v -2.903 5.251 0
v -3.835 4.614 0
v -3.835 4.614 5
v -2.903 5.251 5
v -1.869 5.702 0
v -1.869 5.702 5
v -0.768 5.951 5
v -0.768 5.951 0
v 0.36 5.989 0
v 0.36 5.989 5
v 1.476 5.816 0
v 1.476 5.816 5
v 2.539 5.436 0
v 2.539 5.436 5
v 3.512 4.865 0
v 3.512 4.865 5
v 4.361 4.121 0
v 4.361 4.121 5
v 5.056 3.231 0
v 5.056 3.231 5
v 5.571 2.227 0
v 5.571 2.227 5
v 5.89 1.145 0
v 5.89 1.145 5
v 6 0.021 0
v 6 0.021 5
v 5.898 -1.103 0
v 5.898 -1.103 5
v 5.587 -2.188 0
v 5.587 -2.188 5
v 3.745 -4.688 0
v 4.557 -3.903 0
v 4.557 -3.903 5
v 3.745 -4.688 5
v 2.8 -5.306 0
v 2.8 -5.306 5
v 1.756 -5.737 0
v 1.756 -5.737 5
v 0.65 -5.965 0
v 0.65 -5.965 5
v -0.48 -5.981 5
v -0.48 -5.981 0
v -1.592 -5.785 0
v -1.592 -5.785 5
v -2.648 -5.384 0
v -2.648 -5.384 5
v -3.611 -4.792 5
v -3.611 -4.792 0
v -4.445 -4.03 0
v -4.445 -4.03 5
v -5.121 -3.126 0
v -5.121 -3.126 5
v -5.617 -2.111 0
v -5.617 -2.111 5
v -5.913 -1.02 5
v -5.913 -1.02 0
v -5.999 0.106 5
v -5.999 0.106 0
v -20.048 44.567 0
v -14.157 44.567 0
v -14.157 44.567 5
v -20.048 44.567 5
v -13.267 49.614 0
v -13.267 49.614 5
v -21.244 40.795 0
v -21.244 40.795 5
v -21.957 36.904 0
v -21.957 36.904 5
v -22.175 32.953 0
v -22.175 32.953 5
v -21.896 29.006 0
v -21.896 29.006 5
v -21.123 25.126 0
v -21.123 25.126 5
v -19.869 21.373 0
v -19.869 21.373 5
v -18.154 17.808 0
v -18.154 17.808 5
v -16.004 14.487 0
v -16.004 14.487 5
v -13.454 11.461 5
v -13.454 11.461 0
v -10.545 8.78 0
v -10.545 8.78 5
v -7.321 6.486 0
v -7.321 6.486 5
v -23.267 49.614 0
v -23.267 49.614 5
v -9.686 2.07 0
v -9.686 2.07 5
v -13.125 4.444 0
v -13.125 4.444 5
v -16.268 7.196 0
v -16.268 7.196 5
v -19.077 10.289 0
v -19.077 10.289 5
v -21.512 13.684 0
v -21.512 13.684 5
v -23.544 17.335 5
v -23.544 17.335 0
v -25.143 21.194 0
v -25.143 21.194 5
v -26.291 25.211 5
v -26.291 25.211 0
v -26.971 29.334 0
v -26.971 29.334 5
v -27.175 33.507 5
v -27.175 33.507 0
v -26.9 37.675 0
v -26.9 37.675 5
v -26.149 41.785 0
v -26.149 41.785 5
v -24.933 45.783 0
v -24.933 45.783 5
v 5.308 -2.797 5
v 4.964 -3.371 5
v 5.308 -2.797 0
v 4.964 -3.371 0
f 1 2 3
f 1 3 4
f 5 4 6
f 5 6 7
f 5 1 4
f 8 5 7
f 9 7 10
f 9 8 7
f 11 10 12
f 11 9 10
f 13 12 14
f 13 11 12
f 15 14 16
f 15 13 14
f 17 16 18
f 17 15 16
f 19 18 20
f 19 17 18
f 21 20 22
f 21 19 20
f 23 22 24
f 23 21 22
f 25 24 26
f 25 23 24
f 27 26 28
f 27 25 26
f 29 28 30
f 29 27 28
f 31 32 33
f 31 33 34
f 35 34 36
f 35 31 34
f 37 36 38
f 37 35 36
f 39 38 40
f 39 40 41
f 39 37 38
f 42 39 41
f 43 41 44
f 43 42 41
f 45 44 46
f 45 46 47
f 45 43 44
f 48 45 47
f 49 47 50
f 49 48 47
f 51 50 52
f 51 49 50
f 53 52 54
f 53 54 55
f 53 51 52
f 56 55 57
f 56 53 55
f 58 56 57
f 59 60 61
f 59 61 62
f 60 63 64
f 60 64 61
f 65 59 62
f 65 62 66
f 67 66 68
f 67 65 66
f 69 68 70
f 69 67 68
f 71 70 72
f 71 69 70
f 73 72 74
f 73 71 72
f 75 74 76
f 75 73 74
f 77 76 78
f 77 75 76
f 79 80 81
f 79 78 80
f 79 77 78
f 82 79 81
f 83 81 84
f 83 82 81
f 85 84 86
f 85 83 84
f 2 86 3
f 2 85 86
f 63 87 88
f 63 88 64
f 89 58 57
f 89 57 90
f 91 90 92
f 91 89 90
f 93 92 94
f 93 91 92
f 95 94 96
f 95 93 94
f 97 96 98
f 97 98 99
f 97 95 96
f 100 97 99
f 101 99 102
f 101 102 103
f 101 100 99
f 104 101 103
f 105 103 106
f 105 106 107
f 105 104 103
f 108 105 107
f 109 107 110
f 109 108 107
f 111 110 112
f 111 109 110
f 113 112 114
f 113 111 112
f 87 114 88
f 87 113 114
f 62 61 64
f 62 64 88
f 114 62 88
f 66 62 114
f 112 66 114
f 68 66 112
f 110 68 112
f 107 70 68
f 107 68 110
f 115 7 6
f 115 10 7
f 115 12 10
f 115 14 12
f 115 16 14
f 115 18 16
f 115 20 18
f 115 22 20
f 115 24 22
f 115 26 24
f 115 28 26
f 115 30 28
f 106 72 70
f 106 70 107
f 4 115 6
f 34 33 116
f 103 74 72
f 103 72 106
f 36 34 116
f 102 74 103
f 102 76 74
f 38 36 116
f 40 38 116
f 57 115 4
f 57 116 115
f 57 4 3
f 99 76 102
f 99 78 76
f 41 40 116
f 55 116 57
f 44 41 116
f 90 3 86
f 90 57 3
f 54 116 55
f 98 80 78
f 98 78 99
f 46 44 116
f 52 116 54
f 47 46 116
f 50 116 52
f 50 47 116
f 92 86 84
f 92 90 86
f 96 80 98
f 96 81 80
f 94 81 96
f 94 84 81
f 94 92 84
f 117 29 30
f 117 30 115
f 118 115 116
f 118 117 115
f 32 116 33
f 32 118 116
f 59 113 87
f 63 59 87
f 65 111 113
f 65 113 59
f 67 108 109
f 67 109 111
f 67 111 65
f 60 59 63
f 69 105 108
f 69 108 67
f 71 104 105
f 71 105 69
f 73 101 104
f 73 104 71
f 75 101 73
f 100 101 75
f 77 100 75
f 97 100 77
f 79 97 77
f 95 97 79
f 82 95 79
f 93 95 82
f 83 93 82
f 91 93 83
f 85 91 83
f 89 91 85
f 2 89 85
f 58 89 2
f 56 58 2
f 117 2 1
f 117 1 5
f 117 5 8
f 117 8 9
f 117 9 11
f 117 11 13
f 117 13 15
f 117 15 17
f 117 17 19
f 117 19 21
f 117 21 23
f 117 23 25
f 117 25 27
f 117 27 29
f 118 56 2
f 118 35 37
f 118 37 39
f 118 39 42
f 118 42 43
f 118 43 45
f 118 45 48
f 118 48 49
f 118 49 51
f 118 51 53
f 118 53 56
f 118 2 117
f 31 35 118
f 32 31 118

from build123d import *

# Parameters (mm, degrees)
BOSS_EXTRU_2_DEPTH           = 5
BOSS_EXTRU_8_START           = -1
BOSS_EXTRU_8_DEPTH           = 5
ENL_V_MAT_EXTRU_3_DEPTH      = 57.886804216
ENL_V_MAT_EXTRU_3_DEPTH_BACK = 57.886804216
ESQUISSE8_OUTSIDE_W          = 48.282
ESQUISSE8_OUTSIDE_H          = 25.106


with BuildPart() as part:
    # Esquisse1 → Boss.-Extru.2 (new body)
    with BuildSketch(Plane.XY):
        with BuildLine():
            ThreePointArc((5.586871342, -2.187891362), (5.144080872, -3.088435199), (4.557392942, -3.902584986))
            ThreePointArc((4.557392942, -3.902584986), (-5.144080872, 3.088435199), (5.586871342, -2.187891362))
        make_face()
    extrude(amount=BOSS_EXTRU_2_DEPTH)

    # Esquisse7 → Boss.-Extru.8 (add, symmetric)
    with BuildSketch(Plane(origin=(0, 0, 0), x_dir=(-1, 0, 0), z_dir=(0, 0, -1)).offset(BOSS_EXTRU_8_START)):
        with BuildLine():
            Line((23.267356356, 49.614121246), (13.267356356, 49.614121246))
            Line((13.267356356, 49.614121246), (14.157356645, 44.566678785))
            Line((14.157356645, 44.566678785), (20.047511648, 44.566678785))
            ThreePointArc((20.047511648, 44.566678785), (19.869115778, 21.373460498), (3.835346807, 4.614121246))
            ThreePointArc((3.835346807, 4.614121246), (5.409269967, 2.596112175), (5.999067404, 0.105784144))
            ThreePointArc((5.999067404, 0.105784144), (25.143375104, 21.19405426), (23.267356356, 49.614121246))
        make_face()
    extrude(amount=BOSS_EXTRU_8_DEPTH, both=True)

    # Esquisse8 outside → Enlèv. mat.-Extru.3 (cut, two sides: drawn at the far end of the back side and taken through both)
    with BuildSketch(Plane(origin=(0, 0, 0), x_dir=(1, 0, 0), z_dir=(0, 1, 0)).offset(-ENL_V_MAT_EXTRU_3_DEPTH_BACK)):
        with Locations((-10.588, -1)):
            Rectangle(ESQUISSE8_OUTSIDE_W, ESQUISSE8_OUTSIDE_H)
        Polygon((-31.025150446, 0), (-31.025150446, -5), (-4.47625447, -5), (6.185645272, -5), (6.185645272, 0), (-4.47625447, 0), align=None, mode=Mode.SUBTRACT)
    extrude(amount=ENL_V_MAT_EXTRU_3_DEPTH + ENL_V_MAT_EXTRU_3_DEPTH_BACK, mode=Mode.SUBTRACT)


solid = part.part
